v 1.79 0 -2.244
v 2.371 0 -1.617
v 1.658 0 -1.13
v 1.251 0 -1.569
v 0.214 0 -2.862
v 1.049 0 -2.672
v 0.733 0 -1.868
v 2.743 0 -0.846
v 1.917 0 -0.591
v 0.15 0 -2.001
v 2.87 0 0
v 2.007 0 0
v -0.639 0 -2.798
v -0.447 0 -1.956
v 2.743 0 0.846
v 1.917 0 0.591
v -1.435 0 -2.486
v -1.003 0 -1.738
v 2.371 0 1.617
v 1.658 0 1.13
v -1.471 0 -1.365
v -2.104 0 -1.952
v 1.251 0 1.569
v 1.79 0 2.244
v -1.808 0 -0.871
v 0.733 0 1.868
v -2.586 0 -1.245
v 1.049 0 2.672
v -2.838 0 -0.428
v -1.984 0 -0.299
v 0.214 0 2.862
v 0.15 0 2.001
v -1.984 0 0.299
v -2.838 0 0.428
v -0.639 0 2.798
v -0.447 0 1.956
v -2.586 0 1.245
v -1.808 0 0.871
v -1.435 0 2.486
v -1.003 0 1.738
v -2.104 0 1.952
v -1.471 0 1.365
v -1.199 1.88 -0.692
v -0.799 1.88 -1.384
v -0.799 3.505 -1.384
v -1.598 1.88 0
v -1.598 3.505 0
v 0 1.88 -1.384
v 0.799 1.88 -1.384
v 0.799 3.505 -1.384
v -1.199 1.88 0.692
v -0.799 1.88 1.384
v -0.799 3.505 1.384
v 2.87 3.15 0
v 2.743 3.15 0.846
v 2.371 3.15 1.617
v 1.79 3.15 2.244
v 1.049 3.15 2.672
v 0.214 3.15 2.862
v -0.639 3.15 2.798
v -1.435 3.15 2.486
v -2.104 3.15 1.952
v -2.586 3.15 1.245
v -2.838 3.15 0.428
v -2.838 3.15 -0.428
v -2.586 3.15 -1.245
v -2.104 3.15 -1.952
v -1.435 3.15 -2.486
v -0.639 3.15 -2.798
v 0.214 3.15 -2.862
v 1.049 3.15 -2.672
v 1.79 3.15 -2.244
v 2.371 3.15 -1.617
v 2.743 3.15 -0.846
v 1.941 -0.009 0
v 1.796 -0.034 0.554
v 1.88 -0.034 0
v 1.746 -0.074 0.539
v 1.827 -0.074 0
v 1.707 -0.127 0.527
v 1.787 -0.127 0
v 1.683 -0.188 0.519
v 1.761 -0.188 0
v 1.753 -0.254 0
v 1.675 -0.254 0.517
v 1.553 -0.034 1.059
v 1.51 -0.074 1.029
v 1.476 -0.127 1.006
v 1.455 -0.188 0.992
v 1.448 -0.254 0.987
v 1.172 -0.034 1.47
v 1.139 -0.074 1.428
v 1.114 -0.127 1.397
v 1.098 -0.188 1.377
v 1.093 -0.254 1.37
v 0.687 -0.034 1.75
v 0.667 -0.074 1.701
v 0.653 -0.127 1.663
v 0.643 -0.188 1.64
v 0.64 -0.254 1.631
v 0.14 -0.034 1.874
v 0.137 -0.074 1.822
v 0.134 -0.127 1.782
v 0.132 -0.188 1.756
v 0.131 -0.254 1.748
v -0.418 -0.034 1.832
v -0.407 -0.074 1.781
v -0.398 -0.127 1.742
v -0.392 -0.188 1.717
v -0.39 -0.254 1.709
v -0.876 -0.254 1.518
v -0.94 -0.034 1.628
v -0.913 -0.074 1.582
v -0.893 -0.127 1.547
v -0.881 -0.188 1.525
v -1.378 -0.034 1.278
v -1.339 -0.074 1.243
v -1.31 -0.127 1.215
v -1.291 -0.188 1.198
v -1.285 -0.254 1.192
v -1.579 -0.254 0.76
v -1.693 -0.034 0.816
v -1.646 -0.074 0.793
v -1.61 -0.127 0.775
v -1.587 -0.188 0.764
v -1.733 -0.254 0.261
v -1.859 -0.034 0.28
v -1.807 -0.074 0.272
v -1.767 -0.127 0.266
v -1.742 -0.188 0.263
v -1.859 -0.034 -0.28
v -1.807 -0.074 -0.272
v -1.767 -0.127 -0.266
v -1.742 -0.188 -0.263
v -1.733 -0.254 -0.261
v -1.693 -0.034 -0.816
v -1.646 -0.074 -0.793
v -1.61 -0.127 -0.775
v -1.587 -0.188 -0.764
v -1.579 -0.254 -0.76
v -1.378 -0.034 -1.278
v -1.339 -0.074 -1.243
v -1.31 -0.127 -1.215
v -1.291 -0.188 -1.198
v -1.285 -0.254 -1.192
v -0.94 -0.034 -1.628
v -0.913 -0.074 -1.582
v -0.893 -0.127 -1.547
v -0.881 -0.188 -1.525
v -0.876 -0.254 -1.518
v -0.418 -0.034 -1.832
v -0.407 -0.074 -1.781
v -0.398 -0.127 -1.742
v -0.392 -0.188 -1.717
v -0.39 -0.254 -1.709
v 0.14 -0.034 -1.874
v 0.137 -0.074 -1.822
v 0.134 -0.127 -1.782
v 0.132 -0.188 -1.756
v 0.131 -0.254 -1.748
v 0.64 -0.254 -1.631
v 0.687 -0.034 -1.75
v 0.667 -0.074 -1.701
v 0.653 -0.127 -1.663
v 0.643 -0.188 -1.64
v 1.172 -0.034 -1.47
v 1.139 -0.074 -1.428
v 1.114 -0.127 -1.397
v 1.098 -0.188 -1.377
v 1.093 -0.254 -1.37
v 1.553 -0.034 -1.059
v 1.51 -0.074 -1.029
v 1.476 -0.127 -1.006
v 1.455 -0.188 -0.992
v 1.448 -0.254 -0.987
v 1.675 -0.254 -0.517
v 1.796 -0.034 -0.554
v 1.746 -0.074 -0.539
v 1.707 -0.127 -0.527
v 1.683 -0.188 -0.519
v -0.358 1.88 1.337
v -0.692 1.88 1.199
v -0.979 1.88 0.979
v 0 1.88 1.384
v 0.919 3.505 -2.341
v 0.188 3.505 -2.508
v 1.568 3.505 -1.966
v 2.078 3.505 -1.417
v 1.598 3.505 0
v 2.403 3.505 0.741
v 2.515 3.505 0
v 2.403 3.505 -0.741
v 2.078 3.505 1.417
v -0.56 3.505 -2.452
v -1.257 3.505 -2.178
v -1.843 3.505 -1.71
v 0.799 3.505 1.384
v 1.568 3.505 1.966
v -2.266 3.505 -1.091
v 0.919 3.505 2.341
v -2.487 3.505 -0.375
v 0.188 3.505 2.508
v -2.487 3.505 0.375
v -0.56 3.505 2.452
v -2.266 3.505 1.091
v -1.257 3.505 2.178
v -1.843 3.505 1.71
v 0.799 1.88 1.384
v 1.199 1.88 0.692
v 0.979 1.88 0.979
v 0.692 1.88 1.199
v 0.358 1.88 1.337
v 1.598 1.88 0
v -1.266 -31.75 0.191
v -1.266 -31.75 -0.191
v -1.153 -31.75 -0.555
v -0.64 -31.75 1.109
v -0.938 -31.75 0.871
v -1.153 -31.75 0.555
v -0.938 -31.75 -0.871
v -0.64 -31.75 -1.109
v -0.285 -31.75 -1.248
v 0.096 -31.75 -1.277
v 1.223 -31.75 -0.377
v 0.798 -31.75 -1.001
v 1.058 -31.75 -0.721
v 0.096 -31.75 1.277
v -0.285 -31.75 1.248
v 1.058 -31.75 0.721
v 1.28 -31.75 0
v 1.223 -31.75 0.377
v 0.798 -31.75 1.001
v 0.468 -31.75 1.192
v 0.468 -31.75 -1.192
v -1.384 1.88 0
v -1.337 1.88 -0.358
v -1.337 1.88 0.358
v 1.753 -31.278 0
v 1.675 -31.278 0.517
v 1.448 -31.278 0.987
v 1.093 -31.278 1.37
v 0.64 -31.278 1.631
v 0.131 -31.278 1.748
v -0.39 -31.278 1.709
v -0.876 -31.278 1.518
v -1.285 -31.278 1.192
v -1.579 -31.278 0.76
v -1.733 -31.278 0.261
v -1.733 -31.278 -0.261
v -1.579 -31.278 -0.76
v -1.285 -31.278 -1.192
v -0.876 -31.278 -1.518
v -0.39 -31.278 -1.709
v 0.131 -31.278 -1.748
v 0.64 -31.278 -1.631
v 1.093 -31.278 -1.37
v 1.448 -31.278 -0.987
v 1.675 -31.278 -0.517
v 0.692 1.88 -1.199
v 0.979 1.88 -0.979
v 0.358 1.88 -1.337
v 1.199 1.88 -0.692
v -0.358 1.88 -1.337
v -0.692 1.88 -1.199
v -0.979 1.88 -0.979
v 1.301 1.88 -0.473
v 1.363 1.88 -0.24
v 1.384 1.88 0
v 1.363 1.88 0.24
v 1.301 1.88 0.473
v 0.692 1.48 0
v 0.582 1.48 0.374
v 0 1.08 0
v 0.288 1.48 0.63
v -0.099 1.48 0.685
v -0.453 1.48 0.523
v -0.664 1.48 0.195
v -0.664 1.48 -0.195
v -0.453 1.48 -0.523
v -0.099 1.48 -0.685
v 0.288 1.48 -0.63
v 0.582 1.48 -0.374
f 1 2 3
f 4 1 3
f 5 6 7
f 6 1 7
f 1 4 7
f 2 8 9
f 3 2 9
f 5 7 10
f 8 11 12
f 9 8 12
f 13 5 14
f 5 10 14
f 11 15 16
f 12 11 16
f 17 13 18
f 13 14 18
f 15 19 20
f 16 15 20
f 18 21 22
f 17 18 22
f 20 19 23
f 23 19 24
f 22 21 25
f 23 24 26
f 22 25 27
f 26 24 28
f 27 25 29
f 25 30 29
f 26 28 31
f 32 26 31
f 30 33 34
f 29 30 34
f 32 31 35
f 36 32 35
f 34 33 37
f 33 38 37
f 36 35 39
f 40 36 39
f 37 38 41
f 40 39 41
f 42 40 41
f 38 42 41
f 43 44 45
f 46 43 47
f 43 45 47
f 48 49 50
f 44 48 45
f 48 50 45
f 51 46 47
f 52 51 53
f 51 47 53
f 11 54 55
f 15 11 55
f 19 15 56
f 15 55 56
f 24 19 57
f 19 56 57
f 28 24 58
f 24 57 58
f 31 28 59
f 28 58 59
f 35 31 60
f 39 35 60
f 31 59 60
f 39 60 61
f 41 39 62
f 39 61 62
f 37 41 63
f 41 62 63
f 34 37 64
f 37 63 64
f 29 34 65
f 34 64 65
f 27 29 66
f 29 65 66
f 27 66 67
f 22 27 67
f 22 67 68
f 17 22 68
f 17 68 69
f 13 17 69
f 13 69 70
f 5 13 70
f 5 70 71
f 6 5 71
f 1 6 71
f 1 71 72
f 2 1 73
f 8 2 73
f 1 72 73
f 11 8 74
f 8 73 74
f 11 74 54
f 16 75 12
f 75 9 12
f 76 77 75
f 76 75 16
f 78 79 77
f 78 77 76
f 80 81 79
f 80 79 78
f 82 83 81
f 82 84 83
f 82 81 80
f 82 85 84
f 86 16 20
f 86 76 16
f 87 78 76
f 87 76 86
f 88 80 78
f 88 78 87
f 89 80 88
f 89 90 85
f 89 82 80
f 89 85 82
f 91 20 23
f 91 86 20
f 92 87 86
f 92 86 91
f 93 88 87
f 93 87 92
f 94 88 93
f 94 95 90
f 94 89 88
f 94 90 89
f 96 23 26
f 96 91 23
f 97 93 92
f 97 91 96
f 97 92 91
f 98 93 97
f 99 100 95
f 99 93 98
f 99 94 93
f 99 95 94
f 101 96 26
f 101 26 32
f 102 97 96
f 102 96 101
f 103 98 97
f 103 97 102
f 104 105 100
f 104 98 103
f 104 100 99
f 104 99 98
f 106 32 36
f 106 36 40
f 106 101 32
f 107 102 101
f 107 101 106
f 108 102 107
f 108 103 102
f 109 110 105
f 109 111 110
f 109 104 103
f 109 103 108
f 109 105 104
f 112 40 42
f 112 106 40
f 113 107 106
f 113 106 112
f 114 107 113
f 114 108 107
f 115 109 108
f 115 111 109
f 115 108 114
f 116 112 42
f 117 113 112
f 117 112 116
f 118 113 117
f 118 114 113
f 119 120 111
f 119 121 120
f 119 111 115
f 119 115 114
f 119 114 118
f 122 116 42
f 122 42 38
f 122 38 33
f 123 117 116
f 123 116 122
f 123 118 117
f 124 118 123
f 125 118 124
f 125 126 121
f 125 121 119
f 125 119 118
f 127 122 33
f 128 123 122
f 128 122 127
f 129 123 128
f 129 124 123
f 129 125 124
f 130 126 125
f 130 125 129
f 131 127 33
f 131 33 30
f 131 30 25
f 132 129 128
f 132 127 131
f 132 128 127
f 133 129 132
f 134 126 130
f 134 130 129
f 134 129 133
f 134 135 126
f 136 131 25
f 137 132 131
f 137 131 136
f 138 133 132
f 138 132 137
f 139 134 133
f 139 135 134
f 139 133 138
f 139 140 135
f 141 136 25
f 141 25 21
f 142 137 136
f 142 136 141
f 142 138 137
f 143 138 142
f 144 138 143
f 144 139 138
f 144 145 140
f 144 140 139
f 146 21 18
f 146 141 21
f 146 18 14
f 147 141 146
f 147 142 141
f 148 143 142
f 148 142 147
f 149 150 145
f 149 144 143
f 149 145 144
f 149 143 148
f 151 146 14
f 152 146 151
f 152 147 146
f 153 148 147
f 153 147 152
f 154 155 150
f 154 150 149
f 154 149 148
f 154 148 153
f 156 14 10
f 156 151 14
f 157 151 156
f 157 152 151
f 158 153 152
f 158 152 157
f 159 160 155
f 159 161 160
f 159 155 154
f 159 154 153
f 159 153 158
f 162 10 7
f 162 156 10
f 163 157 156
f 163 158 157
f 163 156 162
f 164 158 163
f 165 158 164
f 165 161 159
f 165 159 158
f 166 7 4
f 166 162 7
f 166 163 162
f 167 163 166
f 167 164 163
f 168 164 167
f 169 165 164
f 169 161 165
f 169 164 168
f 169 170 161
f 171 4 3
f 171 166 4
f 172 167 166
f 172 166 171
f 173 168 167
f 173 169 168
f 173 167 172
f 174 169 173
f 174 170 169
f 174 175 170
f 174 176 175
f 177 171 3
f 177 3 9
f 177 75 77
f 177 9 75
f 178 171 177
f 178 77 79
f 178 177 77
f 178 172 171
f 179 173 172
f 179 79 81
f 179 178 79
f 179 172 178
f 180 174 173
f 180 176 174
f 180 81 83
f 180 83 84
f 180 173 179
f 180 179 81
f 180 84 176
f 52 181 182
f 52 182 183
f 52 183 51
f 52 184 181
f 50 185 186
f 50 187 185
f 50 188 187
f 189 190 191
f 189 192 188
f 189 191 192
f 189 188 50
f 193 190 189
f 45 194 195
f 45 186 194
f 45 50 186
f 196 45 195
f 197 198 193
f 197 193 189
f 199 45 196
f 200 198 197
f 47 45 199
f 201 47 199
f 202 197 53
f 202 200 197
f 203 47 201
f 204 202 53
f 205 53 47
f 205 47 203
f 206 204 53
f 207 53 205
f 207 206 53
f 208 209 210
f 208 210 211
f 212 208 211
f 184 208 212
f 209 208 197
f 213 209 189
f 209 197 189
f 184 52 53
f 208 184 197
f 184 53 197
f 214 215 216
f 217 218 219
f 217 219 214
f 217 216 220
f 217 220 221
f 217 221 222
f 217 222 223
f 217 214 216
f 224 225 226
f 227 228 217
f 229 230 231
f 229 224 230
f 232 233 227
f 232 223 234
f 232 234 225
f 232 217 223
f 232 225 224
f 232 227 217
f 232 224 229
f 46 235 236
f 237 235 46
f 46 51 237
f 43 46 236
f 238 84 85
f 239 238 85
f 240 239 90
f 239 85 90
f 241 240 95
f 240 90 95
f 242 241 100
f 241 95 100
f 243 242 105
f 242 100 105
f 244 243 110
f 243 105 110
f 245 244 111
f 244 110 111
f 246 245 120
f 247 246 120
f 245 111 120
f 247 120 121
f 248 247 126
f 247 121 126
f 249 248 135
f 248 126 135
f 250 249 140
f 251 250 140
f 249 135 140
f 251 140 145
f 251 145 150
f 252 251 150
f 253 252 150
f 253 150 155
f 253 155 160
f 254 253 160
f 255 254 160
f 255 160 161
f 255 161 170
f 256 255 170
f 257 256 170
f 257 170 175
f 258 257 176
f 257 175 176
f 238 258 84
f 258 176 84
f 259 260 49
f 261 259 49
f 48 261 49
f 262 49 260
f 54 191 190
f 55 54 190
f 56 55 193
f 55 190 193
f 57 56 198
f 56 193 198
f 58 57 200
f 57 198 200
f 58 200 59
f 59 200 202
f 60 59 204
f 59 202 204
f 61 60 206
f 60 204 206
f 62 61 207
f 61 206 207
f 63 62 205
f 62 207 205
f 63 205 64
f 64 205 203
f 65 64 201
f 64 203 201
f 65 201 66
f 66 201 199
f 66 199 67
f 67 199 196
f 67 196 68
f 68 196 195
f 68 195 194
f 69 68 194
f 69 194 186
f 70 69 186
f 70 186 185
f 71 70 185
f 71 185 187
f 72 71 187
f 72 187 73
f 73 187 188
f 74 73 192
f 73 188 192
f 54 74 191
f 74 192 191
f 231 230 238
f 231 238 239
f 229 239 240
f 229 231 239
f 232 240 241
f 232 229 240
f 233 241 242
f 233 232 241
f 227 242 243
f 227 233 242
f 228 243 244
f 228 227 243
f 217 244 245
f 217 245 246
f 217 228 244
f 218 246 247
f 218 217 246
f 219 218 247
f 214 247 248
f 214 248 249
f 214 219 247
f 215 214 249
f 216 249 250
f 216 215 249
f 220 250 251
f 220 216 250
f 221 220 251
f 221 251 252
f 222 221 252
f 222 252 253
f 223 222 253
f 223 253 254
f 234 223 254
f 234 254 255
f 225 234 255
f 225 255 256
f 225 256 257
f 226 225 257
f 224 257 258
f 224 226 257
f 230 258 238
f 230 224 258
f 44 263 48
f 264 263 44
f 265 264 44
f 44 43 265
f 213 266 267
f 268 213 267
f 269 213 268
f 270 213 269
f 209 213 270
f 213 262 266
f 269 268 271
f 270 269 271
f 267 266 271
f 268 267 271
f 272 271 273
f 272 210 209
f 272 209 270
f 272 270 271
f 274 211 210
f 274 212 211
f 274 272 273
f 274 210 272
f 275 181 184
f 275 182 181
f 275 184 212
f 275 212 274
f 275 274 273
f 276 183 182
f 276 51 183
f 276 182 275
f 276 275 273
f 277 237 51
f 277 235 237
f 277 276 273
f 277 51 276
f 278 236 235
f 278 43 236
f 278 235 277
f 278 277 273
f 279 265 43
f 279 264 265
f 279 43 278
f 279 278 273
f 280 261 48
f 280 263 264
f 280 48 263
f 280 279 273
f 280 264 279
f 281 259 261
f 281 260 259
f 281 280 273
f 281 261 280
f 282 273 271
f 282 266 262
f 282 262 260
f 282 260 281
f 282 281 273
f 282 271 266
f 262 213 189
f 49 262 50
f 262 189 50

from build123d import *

# Parameters (mm, degrees)
SKETCH1_W           = 2.8702
SKETCH1_H           = 3.5052
SKETCH2_R           = 1.7526
BOSS_EXTRUDE1_DEPTH = 31.75
CUT_EXTRUDE1_DEPTH  = 1.6256
CHAMFER1_SIZE       = 0.47244
CHAMFER2_SIZE       = 0.3556
FILLET1_R           = 0.254


with BuildPart() as part:
    # Sketch1 → Revolve1 (revolve)
    with BuildSketch(Plane.XY):
        with Locations((1.4351, 1.7526)):
            Rectangle(SKETCH1_W, SKETCH1_H)
    revolve(axis=Axis((0, 3.5052, 0), (0, -1, 0)))

    # Sketch2 → Boss-Extrude1 (add)
    with BuildSketch(Plane.XZ):
        Circle(SKETCH2_R)
    extrude(amount=BOSS_EXTRUDE1_DEPTH)

    # Sketch3 → Cut-Extrude1 (cut)
    with BuildSketch(Plane(origin=(0, 3.5052, 0), x_dir=(-1, 0, 0), z_dir=(0, 1, 0))):
        Polygon((-0.799225978, 1.3843), (-1.598451955, 0), (-0.799225978, -1.3843), (0.799225978, -1.3843), (1.598451955, 0), (0.799225978, 1.3843), align=None)
    extrude(amount=-CUT_EXTRUDE1_DEPTH, mode=Mode.SUBTRACT)

    # Sketch4 → Cut-Revolve1 (revolve, cut)
    with BuildSketch(Plane.XY):
        Polygon((1.3843, 1.8796), (0, 1.8796), (0, 1.080374022), align=None)
    revolve(axis=Axis((0, 1.879625, 0), (0, -1, 0)), mode=Mode.SUBTRACT)

    # Chamfer1
    chamfer1_edges = [part.edges().sort_by_distance(p)[0] for p in [
        (-1.7526, -31.75, 0),
    ]]
    chamfer(chamfer1_edges, length=CHAMFER1_SIZE)

    # Chamfer2
    chamfer2_edges = [part.edges().sort_by_distance(p)[0] for p in [
        (-2.8702, 3.5052, 0),
    ]]
    chamfer(chamfer2_edges, length=CHAMFER2_SIZE)

    # Fillet1
    fillet1_edges = [part.edges().sort_by_distance(p)[0] for p in [
        (-1.7526, 0, 0),
    ]]
    fillet(fillet1_edges, radius=FILLET1_R)


solid = part.part
